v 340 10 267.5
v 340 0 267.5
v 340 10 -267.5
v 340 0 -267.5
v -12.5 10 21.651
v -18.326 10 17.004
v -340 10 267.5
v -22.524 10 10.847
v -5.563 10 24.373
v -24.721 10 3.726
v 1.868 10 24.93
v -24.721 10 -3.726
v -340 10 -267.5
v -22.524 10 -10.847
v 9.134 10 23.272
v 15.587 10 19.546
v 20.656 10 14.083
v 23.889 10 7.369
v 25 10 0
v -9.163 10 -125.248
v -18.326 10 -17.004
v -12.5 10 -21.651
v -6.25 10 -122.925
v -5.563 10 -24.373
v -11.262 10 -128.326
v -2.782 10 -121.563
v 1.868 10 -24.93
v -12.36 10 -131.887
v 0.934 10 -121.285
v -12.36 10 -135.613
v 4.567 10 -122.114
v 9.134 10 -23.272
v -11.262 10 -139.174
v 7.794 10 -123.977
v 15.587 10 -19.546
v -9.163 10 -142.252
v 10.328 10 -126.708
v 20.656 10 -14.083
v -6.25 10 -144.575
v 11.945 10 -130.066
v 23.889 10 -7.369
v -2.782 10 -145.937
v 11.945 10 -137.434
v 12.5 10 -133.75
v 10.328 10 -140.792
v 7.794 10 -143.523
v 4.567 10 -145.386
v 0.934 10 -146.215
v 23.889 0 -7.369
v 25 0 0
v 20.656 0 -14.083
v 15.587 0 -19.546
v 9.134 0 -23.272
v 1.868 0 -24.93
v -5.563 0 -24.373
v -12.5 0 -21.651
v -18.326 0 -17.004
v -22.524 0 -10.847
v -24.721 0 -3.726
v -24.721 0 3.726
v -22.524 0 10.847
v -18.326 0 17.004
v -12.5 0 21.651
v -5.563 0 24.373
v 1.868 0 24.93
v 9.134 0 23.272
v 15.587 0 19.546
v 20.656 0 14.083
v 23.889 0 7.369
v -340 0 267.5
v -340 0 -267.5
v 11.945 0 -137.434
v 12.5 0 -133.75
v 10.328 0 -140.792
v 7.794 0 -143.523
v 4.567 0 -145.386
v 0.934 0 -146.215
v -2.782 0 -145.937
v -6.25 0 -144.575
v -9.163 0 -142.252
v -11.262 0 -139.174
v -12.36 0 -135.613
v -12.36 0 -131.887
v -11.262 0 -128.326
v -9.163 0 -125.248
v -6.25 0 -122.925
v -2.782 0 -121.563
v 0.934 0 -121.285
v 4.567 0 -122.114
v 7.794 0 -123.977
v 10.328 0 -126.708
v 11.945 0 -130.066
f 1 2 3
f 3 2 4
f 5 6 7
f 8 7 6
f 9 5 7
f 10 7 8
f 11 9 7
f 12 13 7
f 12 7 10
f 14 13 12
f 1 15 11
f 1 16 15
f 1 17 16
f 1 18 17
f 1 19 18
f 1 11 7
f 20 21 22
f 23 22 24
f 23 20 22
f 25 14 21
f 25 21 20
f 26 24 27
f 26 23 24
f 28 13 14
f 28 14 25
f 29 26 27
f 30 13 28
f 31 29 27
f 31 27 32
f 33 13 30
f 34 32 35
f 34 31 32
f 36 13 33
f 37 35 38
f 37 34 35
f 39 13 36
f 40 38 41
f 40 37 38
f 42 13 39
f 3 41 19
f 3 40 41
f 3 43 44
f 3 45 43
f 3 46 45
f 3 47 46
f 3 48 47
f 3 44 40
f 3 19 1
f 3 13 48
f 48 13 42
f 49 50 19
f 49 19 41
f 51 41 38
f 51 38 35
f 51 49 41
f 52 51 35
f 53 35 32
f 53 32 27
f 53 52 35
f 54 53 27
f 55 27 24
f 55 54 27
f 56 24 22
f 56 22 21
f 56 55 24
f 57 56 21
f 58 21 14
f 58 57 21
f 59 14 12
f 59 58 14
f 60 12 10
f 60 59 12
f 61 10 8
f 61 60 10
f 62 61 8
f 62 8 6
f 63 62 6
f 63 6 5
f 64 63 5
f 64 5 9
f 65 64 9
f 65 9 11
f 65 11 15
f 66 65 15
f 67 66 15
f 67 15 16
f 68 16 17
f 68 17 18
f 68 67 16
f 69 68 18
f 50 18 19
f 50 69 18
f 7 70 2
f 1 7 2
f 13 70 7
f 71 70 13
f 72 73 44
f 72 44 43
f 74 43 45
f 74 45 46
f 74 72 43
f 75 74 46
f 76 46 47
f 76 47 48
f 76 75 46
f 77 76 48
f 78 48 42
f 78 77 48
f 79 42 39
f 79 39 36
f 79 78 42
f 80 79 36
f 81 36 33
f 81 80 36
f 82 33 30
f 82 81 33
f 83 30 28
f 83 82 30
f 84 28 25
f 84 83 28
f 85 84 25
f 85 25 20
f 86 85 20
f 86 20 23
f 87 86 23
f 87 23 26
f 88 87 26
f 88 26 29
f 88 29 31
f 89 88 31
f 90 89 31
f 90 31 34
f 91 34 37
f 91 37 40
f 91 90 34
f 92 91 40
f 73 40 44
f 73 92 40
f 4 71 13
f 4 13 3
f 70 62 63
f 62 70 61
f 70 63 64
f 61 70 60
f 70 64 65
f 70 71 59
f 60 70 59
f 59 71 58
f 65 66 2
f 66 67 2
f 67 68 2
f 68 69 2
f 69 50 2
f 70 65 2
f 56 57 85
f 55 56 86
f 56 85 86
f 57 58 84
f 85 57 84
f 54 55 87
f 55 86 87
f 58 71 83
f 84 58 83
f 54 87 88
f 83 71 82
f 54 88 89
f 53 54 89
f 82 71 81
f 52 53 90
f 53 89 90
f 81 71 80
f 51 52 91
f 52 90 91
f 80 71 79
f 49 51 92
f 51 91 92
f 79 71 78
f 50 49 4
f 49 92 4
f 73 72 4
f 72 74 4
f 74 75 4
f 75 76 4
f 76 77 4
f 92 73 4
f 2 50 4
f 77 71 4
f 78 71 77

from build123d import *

# Parameters (mm, degrees)
SKETCH1_W           = 680
SKETCH1_H           = 535
SKETCH1_R           = 25
SKETCH1_R_2         = 12.5
BOSS_EXTRUDE1_DEPTH = 10


with BuildPart() as part:
    # Sketch1 → Boss-Extrude1 (new body)
    with BuildSketch(Plane(origin=(0, 0, 0), x_dir=(1, 0, 0), z_dir=(0, 1, 0))):
        Rectangle(SKETCH1_W, SKETCH1_H)
        Circle(SKETCH1_R, mode=Mode.SUBTRACT)
        with Locations((0, 133.75)):
            Circle(SKETCH1_R_2, mode=Mode.SUBTRACT)
    extrude(amount=BOSS_EXTRUDE1_DEPTH)


solid = part.part
